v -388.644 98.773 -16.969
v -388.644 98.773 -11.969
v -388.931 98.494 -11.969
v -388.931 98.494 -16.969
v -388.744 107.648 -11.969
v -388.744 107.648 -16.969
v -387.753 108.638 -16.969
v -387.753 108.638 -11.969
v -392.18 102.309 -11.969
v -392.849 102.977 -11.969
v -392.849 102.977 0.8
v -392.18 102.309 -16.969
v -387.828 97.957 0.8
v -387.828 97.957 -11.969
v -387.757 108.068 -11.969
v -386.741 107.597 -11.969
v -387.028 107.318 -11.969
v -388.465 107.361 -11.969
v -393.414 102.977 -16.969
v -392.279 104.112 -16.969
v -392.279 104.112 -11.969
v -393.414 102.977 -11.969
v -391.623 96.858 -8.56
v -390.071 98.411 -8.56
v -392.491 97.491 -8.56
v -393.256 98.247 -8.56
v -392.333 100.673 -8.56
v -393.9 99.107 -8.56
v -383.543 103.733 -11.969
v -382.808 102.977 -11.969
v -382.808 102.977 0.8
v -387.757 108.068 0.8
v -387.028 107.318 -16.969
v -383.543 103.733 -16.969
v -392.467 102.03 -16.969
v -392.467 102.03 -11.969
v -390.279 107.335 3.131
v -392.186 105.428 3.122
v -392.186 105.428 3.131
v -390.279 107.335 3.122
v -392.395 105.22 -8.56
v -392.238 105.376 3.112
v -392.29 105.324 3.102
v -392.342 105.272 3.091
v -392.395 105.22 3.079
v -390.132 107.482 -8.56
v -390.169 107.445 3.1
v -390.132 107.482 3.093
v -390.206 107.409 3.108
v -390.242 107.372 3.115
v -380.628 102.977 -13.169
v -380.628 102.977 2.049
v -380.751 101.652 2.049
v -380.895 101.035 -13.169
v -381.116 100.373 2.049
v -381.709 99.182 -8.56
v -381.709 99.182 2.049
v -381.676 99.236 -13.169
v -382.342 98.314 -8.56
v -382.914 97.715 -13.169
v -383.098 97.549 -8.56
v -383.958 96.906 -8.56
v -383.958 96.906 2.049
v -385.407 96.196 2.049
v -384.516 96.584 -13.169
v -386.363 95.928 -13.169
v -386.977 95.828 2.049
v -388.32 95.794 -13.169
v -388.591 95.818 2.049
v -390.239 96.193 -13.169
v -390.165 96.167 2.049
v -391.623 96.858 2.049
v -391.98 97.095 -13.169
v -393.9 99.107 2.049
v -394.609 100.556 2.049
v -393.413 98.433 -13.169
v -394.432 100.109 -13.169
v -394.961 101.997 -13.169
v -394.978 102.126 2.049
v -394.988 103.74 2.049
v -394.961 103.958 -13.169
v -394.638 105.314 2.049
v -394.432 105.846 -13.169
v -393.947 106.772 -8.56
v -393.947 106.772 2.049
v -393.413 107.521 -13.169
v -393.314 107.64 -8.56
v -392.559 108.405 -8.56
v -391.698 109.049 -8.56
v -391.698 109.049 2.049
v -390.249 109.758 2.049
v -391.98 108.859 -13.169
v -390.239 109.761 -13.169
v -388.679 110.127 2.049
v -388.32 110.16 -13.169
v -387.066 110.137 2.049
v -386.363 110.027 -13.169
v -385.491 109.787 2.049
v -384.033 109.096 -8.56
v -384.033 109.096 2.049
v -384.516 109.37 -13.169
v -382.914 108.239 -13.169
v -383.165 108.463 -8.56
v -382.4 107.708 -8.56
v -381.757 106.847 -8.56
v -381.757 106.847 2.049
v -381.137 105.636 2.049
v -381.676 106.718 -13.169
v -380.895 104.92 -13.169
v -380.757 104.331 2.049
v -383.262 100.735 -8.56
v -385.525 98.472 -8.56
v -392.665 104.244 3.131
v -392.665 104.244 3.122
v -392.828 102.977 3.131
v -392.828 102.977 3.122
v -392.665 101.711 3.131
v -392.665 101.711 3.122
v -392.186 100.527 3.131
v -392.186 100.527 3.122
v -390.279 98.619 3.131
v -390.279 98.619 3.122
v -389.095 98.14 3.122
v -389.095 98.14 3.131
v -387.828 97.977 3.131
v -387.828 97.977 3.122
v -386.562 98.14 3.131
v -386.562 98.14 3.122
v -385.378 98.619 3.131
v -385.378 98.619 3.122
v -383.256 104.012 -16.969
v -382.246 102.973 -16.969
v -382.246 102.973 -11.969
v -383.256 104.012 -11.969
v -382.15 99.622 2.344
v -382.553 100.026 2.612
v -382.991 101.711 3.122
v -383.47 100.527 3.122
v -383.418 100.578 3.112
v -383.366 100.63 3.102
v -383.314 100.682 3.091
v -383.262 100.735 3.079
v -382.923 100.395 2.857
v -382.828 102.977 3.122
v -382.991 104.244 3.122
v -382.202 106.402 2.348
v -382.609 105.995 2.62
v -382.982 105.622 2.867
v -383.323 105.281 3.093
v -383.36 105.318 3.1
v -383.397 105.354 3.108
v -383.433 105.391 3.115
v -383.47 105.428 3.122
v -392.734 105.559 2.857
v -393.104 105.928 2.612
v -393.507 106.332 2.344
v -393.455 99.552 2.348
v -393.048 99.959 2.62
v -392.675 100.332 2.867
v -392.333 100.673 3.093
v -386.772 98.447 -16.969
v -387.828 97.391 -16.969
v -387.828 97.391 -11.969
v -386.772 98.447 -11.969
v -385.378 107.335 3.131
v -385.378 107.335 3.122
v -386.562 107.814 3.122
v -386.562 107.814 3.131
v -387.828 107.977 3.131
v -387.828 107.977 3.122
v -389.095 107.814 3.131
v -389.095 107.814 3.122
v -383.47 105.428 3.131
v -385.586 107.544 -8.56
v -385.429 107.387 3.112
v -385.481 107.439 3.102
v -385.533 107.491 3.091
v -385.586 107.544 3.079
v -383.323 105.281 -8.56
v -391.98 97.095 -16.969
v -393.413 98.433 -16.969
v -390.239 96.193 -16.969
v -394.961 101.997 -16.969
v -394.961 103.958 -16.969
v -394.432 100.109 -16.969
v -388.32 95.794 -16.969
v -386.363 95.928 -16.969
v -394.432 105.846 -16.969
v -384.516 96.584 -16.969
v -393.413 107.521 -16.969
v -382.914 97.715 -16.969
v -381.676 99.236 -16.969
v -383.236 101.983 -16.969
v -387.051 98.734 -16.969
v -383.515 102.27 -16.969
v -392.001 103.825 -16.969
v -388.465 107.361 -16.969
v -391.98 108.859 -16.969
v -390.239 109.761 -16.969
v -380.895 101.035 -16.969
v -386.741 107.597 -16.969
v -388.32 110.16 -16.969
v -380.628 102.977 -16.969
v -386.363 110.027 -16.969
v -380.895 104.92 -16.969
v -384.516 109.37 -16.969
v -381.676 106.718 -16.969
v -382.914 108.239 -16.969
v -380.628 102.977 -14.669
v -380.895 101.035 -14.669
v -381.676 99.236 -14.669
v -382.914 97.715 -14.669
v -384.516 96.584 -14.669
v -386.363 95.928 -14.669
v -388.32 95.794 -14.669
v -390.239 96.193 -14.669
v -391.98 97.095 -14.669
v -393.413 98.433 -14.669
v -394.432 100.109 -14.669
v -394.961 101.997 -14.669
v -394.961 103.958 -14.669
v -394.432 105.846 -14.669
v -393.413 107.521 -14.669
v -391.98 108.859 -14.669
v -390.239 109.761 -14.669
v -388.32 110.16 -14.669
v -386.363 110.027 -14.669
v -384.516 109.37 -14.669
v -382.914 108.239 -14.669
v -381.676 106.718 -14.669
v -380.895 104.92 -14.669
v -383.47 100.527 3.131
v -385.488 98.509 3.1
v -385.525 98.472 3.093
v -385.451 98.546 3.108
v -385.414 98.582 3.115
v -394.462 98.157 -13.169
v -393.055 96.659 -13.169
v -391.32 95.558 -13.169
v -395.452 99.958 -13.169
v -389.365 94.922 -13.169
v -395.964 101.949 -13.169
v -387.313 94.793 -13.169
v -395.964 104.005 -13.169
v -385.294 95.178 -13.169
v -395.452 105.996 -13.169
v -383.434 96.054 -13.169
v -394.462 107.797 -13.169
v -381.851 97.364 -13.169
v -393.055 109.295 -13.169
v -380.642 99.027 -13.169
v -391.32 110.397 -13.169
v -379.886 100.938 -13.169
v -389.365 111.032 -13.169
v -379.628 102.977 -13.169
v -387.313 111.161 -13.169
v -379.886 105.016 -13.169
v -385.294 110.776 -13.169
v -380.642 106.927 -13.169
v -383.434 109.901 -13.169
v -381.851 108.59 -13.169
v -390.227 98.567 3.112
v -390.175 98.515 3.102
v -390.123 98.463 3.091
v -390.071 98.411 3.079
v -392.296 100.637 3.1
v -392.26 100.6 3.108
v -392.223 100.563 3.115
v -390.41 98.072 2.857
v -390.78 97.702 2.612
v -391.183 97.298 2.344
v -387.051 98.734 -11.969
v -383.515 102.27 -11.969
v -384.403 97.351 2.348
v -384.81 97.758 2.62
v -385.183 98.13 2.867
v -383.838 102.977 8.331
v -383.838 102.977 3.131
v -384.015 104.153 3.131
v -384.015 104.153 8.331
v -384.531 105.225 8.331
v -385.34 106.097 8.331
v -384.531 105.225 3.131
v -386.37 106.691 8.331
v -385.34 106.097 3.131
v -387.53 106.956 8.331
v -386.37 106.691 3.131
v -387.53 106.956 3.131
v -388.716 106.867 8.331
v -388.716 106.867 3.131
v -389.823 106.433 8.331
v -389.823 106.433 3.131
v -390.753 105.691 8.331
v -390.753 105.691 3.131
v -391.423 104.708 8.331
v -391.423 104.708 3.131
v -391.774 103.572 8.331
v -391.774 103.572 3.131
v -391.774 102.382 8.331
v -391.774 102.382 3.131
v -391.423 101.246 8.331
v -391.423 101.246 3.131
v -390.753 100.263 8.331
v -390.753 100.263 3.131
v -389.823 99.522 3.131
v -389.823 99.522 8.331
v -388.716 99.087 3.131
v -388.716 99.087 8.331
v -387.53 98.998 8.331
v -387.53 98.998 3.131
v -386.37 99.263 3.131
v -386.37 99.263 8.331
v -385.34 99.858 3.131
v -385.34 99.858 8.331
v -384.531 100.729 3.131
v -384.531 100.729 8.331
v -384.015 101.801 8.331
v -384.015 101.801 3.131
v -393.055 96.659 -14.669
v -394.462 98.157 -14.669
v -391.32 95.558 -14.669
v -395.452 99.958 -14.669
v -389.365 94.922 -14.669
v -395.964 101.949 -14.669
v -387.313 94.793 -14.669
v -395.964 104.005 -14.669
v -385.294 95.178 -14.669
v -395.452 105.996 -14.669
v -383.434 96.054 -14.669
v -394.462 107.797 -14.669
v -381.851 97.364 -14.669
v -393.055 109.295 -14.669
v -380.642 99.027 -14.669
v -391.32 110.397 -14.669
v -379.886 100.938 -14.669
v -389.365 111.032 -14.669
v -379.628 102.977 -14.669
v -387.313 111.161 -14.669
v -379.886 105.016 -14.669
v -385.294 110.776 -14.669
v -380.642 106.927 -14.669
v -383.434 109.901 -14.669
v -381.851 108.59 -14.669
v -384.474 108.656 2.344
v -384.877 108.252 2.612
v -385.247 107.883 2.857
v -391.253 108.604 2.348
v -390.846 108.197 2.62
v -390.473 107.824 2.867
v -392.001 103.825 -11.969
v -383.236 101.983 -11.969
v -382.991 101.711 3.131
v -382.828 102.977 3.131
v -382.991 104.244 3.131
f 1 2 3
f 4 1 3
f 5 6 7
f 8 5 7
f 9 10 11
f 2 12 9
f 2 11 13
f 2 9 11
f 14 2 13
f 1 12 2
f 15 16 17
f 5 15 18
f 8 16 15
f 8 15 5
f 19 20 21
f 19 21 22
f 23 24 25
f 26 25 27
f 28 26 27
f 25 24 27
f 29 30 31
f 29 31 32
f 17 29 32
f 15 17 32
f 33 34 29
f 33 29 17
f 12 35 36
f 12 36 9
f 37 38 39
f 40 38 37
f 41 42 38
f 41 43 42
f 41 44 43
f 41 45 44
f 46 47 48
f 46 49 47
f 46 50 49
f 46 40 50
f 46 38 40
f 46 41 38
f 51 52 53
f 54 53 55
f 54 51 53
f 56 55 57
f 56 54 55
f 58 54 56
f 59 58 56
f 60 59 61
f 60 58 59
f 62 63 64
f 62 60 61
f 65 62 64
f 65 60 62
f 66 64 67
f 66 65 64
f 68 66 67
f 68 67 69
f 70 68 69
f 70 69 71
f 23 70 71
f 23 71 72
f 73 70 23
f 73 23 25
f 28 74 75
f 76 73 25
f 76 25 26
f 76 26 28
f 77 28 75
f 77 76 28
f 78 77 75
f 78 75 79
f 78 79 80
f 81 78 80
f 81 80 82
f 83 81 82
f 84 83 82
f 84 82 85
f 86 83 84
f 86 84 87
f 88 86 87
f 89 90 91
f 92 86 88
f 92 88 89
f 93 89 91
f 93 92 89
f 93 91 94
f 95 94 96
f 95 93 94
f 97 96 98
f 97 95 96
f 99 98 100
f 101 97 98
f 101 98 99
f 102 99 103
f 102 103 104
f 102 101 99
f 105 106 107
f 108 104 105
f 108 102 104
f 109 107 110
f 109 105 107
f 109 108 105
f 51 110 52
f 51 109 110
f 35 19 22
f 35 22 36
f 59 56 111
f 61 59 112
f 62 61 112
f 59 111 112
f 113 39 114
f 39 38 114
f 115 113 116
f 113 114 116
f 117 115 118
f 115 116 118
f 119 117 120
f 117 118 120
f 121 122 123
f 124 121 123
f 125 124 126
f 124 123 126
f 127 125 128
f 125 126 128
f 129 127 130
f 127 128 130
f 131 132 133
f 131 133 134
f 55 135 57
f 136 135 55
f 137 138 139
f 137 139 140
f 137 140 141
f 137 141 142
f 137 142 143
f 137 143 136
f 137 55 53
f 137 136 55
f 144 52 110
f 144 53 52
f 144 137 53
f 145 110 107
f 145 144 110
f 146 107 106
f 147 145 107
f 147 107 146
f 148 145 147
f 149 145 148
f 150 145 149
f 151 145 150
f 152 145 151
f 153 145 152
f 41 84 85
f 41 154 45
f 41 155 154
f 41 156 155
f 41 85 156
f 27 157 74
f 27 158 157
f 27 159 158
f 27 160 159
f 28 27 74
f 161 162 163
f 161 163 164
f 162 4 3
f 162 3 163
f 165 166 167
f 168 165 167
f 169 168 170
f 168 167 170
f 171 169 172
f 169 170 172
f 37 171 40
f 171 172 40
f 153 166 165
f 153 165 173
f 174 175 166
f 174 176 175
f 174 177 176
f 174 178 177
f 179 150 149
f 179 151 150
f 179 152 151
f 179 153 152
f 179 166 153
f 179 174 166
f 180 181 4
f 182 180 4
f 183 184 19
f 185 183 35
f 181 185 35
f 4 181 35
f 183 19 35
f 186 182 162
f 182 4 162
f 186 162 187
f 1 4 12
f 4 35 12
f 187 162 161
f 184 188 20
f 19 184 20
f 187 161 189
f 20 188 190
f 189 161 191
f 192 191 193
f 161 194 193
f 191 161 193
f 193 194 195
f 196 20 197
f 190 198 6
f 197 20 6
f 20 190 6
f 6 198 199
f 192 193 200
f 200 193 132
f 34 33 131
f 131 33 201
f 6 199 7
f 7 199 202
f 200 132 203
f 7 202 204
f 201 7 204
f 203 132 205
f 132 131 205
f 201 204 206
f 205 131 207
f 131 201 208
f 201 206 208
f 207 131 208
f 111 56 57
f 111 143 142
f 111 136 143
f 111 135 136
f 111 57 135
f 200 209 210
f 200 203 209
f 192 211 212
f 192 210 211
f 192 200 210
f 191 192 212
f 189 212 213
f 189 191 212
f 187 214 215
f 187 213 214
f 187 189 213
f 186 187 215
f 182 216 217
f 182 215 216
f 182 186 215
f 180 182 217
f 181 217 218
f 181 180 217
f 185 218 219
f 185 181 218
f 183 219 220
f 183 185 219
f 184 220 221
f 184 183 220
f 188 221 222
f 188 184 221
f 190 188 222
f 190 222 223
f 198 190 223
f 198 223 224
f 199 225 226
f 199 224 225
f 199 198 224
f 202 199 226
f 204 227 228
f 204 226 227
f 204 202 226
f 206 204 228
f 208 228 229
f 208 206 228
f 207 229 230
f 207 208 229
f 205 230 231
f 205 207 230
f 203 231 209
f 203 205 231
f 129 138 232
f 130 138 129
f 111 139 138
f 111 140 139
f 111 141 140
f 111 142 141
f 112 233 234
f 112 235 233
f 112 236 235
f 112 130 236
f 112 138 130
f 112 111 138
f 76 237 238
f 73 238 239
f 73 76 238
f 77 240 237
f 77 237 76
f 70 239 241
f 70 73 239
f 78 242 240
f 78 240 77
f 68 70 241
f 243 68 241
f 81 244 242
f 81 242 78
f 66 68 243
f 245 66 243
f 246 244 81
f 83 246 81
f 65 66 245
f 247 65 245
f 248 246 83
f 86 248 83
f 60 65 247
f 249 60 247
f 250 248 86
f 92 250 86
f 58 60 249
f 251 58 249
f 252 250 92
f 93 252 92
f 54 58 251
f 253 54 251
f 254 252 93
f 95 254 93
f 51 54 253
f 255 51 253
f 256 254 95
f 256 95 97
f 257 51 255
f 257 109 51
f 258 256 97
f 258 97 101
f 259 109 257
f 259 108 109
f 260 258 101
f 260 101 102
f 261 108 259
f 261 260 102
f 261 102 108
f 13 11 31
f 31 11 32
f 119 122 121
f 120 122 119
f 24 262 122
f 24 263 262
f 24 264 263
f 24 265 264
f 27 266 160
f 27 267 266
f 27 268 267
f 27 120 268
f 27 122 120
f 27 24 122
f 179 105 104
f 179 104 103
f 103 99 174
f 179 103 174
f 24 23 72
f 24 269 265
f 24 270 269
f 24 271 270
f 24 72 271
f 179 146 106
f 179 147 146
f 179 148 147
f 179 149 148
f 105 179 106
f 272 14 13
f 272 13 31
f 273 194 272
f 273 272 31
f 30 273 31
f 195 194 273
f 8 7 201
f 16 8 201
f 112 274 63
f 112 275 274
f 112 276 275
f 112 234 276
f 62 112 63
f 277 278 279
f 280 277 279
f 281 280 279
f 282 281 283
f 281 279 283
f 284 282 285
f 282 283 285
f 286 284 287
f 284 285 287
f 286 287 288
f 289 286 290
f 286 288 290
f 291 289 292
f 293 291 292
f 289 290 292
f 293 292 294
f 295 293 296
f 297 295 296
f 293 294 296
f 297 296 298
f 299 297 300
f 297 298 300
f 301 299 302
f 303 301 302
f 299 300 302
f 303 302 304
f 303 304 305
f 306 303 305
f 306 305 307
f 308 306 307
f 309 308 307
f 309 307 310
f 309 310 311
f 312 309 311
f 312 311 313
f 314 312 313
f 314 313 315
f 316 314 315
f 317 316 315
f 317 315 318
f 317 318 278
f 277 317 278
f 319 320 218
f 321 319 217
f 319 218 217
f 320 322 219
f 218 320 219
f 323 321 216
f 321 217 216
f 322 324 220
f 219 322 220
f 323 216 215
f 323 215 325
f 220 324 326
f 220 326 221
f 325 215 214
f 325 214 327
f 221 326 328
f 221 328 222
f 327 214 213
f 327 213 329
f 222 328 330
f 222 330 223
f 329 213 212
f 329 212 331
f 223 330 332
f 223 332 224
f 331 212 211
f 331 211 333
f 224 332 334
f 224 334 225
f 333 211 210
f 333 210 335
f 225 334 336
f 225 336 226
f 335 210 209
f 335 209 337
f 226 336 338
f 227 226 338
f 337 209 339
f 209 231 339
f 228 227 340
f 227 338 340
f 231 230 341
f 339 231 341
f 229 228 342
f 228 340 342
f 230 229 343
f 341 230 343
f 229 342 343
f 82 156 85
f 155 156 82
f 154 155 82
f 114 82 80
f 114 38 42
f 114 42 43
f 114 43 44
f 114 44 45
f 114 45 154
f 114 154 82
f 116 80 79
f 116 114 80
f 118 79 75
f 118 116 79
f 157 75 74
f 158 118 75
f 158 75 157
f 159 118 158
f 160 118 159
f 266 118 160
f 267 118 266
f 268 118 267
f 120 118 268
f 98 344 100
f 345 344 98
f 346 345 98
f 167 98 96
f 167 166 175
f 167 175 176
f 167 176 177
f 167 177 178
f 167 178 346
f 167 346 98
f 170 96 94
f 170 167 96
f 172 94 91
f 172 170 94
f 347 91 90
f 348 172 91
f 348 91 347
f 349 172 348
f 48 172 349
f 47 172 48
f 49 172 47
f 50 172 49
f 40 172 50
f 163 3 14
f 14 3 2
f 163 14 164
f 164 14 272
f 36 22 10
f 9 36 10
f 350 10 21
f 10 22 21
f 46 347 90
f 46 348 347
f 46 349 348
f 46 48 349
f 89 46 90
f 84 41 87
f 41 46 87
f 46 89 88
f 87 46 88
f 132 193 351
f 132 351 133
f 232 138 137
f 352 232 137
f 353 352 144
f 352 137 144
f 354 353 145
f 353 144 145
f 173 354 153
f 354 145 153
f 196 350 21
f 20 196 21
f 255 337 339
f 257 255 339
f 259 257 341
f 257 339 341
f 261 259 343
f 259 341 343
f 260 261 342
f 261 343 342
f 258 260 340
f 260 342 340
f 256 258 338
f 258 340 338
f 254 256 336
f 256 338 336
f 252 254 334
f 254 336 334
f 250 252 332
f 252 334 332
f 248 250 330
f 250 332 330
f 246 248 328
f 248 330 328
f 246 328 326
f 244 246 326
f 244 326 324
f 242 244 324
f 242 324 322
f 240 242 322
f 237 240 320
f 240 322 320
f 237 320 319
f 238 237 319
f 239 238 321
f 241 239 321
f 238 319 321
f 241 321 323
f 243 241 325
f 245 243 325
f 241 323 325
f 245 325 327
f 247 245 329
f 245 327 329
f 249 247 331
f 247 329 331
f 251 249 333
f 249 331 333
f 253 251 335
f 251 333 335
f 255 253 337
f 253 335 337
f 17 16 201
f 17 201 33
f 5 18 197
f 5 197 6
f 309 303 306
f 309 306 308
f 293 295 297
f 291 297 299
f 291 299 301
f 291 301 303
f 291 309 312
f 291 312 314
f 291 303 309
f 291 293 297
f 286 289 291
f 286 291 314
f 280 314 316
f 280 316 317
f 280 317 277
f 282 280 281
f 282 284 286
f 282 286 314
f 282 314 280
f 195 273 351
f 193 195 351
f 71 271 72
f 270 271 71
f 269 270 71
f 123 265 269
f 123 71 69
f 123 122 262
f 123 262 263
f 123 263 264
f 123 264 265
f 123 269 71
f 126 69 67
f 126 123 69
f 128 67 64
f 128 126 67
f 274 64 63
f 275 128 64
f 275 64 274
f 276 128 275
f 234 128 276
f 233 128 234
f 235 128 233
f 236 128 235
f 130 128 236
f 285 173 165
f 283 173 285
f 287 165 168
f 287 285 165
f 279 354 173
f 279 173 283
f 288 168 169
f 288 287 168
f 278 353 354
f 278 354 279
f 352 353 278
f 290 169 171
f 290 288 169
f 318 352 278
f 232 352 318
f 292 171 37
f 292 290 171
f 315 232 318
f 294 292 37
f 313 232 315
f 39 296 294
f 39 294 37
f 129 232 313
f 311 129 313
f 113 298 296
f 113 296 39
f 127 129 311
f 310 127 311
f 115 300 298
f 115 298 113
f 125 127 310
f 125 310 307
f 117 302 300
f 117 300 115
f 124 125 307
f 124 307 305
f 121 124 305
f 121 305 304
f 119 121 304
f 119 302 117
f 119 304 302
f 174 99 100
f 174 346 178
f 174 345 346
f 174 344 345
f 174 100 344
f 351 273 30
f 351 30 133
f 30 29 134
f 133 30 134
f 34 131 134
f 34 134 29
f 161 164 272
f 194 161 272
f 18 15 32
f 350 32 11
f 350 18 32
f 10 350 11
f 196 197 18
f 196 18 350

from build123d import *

# Parameters (mm, degrees)
EXTRUDE_1_DEPTH      = 0.3
EXTRUDE_1_DEPTH_BACK = 16.969059
SKETCH_1_R           = 7.2
SKETCH_1_2_R         = 7.2
EXTRUDE_2_DEPTH      = 2
SKETCH_2_R           = 3.99
EXTRUDE_3_DEPTH      = 6.330940566
SKETCH_2_3_R         = 5
SKETCH_2_3_R_2       = 3.99
EXTRUDE_4_DEPTH      = 1.130940566
CHAMFER_1_SIZE       = 2.3
CHAMFER_1_SIZE_2     = 1.121784954
EXTRUDE_START        = 0.3
SKETCH_3_R           = 8.2
SKETCH_3_R_2         = 7.2
EXTRUDE_5_DEPTH      = 1.5
CUT_EXTRUDE_START    = 0.1
SKETCH_5_R           = 31.525677416
CUT_EXTRUDE_1_DEPTH  = 412.780220489
CUT_EXTRUDE_2_DEPTH  = 5
MOVE_FACE_1_BY       = 0.8


with BuildPart() as part:
    # Эскиз1 → Бобышка-Вытянуть1 (new, two sides: drawn at the far end of the back side and taken through both)
    with BuildSketch(Plane.XY.offset(-EXTRUDE_1_DEPTH_BACK)):
        with Locations((-387.828180977, 102.977102389)):
            Circle(SKETCH_1_R)
        Polygon((-387.828180977, 97.956644243), (-382.80772283, 102.977102389), (-387.757470299, 108.068271214), (-392.848639123, 102.977102389), align=None, mode=Mode.SUBTRACT)
    extrude(amount=EXTRUDE_1_DEPTH + EXTRUDE_1_DEPTH_BACK)

    # Эскиз1<2> → Бобышка-Вытянуть2 (add)
    with BuildSketch(Plane.XY):
        with Locations((-387.828180977, 102.977102389)):
            Circle(SKETCH_1_2_R)
    extrude(amount=EXTRUDE_2_DEPTH)

    # Эскиз2 → Бобышка-Вытянуть3 (add)
    with BuildSketch(Plane.XY.offset(2)):
        with Locations((-387.828180977, 102.977102389)):
            Circle(SKETCH_2_R)
    extrude(amount=EXTRUDE_3_DEPTH)

    # Эскиз2<3> → Бобышка-Вытянуть4 (add)
    with BuildSketch(Plane.XY.offset(2)):
        with Locations(Location((-387.828180977, 102.977102389, 0), (0, 0, 180))):
            Circle(SKETCH_2_3_R)
        with Locations((-387.828180977, 102.977102389)):
            Circle(SKETCH_2_3_R_2, mode=Mode.SUBTRACT)
    extrude(amount=EXTRUDE_4_DEPTH)

    # Фаска1
    # the kernel refuses this chamfer: 2.3, 1.121784954 mm, written as the material it adds along each edge
    with BuildSketch(Plane(origin=(-387.828180977, 102.977102389, 2), x_dir=(-1, 0, 0), z_dir=(0, 1, 0))) as chamfer_1_piece_1_section:
        Polygon((5 + CHAMFER_1_SIZE, 0), (5, CHAMFER_1_SIZE_2), (5, 0), align=None)
    chamfer_1_piece_1 = revolve(axis=Axis((-387.828180977, 102.977102389, 2), (0, 0, 1)), mode=Mode.PRIVATE)
    chamfer_1_piece_1 = chamfer_1_piece_1 & Plane(origin=(-387.828180977, 102.977102389, 2.571661691), x_dir=(1, 0, 0), z_dir=(0, 0, -1)) * Cylinder(7.2, 30, mode=Mode.PRIVATE)
    add(chamfer_1_piece_1)

    # Эскиз3 → Бобышка-Вытянуть5 (add)
    with BuildSketch(Plane.XY.offset(-14.969059434).offset(EXTRUDE_START)):
        with Locations((-387.828180977, 102.977102389)):
            Circle(SKETCH_3_R)
        with Locations(Location((-387.828180977, 102.977102389, 0), (0, 0, 180))):
            Circle(SKETCH_3_R_2, mode=Mode.SUBTRACT)
    extrude(amount=EXTRUDE_5_DEPTH)

    # Эскиз5 → Вырез-Вытянуть1 (cut, through all)
    with BuildSketch(Plane(origin=(0, 0, -8.460000998), x_dir=(-1, 0, 0), z_dir=(0, 0, -1)).offset(CUT_EXTRUDE_START)):
        with Locations((387.828180977, 102.977102389)):
            Circle(SKETCH_5_R)
        with BuildLine():
            Line((385.524514896, 98.471917351), (383.813441597, 96.760844053))
            ThreePointArc((383.813441597, 96.760844053), (387.783841084, 95.57723523), (391.7681393, 96.713179624))
            Line((391.7681393, 96.713179624), (390.070624315, 98.410694608))
            Line((390.070624315, 98.410694608), (392.333366015, 100.673436308))
            Line((392.333366015, 100.673436308), (394.044439314, 98.962363009))
            ThreePointArc((394.044439314, 98.962363009), (395.228048136, 102.932762497), (394.092103743, 106.917060712))
            Line((394.092103743, 106.917060712), (392.394588758, 105.219545727))
            Line((392.394588758, 105.219545727), (390.131847058, 107.482287427))
            Line((390.131847058, 107.482287427), (391.842920357, 109.193360726))
            ThreePointArc((391.842920357, 109.193360726), (387.87252087, 110.376969549), (383.888222654, 109.241025155))
            Line((383.888222654, 109.241025155), (385.585737639, 107.54351017))
            Line((385.585737639, 107.54351017), (383.322995939, 105.280768471))
            Line((383.322995939, 105.280768471), (381.61192264, 106.99184177))
            ThreePointArc((381.61192264, 106.99184177), (380.428313818, 103.021442282), (381.564258211, 99.037144067))
            Line((381.564258211, 99.037144067), (383.261773196, 100.734659051))
            Line((383.261773196, 100.734659051), (385.524514896, 98.471917351))
        make_face(mode=Mode.SUBTRACT)
    extrude(amount=-CUT_EXTRUDE_1_DEPTH, mode=Mode.SUBTRACT)

    # Эскиз6 → Вырез-Вытянуть2 (cut)
    with BuildSketch(Plane(origin=(0, 0, -16.969059434), x_dir=(-1, 0, 0), z_dir=(0, 0, -1))):
        Polygon((392.467199832, 102.029977673), (391.330034344, 103.13555523), (392.279390791, 104.112036147), (393.414324548, 102.977102389), align=None)
        Polygon((383.255874897, 104.011882353), (384.259667783, 103.035972602), (383.236040731, 101.983099063), (382.245993053, 102.973146742), align=None)
        Polygon((386.771925298, 98.447214497), (387.844642377, 99.550580636), (388.931315265, 98.494093106), (387.828180977, 97.390958818), align=None)
        Polygon((387.753458546, 108.637968392), (386.741266863, 107.596856947), (387.74505975, 106.620947196), (388.743506224, 107.647920713), align=None)
    extrude(amount=-CUT_EXTRUDE_2_DEPTH, mode=Mode.SUBTRACT)

    # Move Face 1: a face moved inward by 0.8
    extrude(part.faces().sort_by_distance((-387.816313451, 103.000672615, 0))[0], amount=MOVE_FACE_1_BY, dir=(0, 0, 1), mode=Mode.SUBTRACT)


solid = part.part
